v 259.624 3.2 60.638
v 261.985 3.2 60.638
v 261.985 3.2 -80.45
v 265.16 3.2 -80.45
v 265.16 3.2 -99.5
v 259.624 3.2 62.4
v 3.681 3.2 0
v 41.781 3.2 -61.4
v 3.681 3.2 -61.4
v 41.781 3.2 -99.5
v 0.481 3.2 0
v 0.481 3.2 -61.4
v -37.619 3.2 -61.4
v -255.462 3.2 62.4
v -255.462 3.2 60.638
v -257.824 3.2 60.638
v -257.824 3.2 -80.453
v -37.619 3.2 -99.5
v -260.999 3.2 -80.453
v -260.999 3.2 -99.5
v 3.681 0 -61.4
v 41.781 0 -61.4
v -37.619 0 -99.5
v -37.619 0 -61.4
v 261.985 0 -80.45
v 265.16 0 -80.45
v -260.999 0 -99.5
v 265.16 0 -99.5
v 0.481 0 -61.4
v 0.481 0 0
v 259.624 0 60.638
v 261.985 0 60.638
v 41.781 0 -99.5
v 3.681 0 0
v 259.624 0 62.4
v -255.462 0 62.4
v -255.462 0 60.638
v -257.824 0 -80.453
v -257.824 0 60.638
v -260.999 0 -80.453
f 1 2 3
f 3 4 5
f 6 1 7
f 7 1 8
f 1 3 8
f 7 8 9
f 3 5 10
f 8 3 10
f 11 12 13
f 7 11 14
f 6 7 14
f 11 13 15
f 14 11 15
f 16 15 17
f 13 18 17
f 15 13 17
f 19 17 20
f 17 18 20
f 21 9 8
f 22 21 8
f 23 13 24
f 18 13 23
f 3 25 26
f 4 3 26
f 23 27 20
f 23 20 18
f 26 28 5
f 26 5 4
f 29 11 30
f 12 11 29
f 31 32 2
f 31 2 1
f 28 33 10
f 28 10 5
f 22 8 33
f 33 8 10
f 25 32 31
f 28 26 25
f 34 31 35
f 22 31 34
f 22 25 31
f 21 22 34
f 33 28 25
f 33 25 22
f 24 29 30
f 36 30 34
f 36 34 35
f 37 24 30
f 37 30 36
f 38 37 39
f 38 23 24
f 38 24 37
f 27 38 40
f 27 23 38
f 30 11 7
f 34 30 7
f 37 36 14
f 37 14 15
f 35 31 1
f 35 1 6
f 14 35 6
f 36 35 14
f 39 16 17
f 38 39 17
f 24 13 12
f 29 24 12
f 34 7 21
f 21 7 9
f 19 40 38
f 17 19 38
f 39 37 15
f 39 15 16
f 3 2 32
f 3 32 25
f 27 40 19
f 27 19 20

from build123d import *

# Parameters (mm, degrees)
BOSS_EXTRUDE1_DEPTH = 3.2
SKETCH11_W          = 3.2
SKETCH11_H          = 199.000000018
CUT_EXTRUDE1_DEPTH  = 284.232260808
SKETCH13_W          = 38.1
SKETCH13_H          = 38.1
CUT_EXTRUDE3_DEPTH  = 284.232260808
SKETCH15_W          = 3.175
SKETCH15_H          = 141.090166638
SKETCH15_H_2        = 141.087880638
CUT_EXTRUDE5_DEPTH  = 284.232260808


with BuildPart() as part:
    # Sketch1 → Boss-Extrude1 (new body)
    with BuildSketch(Plane(origin=(0, 0, 0), x_dir=(1, 0, 0), z_dir=(0, 1, 0))):
        Polygon((265.160373285, -60.637626629), (259.623773233, -60.637626629), (259.623773233, -62.400000041), (-255.462493265, -62.400000041), (-255.462493265, -60.637626629), (-260.999093317, -60.637626629), (-260.999093317, 99.500000009), (265.160373285, 99.500000009), align=None)
    extrude(amount=BOSS_EXTRUDE1_DEPTH)

    # Sketch11 → Cut-Extrude1 (cut, through all)
    with BuildSketch(Plane(origin=(0, 3.2, 0), x_dir=(1, 0, 0), z_dir=(0, 1, 0))):
        with Locations((2.080639984, 99.500000009)):
            Rectangle(SKETCH11_W, SKETCH11_H)
    extrude(amount=-CUT_EXTRUDE1_DEPTH, mode=Mode.SUBTRACT)

    # Sketch13 → Cut-Extrude3 (cut, through all)
    with BuildSketch(Plane(origin=(0, 3.2, 0), x_dir=(1, 0, 0), z_dir=(0, 1, 0))):
        with Locations((-18.569360016, 80.450000009)):
            Rectangle(SKETCH13_W, SKETCH13_H)
        with Locations((22.730639984, 80.450000009)):
            Rectangle(SKETCH13_W, SKETCH13_H)
    extrude(amount=-CUT_EXTRUDE3_DEPTH, mode=Mode.SUBTRACT)

    # Sketch15 → Cut-Extrude5 (cut, through all)
    with BuildSketch(Plane(origin=(0, 3.2, 0), x_dir=(1, 0, 0), z_dir=(0, 1, 0))):
        with Locations((-259.411593317, 9.90745669)):
            Rectangle(SKETCH15_W, SKETCH15_H)
        with Locations((263.572873285, 9.90631369)):
            Rectangle(SKETCH15_W, SKETCH15_H_2)
    extrude(amount=-CUT_EXTRUDE5_DEPTH, mode=Mode.SUBTRACT)


solid = part.part
